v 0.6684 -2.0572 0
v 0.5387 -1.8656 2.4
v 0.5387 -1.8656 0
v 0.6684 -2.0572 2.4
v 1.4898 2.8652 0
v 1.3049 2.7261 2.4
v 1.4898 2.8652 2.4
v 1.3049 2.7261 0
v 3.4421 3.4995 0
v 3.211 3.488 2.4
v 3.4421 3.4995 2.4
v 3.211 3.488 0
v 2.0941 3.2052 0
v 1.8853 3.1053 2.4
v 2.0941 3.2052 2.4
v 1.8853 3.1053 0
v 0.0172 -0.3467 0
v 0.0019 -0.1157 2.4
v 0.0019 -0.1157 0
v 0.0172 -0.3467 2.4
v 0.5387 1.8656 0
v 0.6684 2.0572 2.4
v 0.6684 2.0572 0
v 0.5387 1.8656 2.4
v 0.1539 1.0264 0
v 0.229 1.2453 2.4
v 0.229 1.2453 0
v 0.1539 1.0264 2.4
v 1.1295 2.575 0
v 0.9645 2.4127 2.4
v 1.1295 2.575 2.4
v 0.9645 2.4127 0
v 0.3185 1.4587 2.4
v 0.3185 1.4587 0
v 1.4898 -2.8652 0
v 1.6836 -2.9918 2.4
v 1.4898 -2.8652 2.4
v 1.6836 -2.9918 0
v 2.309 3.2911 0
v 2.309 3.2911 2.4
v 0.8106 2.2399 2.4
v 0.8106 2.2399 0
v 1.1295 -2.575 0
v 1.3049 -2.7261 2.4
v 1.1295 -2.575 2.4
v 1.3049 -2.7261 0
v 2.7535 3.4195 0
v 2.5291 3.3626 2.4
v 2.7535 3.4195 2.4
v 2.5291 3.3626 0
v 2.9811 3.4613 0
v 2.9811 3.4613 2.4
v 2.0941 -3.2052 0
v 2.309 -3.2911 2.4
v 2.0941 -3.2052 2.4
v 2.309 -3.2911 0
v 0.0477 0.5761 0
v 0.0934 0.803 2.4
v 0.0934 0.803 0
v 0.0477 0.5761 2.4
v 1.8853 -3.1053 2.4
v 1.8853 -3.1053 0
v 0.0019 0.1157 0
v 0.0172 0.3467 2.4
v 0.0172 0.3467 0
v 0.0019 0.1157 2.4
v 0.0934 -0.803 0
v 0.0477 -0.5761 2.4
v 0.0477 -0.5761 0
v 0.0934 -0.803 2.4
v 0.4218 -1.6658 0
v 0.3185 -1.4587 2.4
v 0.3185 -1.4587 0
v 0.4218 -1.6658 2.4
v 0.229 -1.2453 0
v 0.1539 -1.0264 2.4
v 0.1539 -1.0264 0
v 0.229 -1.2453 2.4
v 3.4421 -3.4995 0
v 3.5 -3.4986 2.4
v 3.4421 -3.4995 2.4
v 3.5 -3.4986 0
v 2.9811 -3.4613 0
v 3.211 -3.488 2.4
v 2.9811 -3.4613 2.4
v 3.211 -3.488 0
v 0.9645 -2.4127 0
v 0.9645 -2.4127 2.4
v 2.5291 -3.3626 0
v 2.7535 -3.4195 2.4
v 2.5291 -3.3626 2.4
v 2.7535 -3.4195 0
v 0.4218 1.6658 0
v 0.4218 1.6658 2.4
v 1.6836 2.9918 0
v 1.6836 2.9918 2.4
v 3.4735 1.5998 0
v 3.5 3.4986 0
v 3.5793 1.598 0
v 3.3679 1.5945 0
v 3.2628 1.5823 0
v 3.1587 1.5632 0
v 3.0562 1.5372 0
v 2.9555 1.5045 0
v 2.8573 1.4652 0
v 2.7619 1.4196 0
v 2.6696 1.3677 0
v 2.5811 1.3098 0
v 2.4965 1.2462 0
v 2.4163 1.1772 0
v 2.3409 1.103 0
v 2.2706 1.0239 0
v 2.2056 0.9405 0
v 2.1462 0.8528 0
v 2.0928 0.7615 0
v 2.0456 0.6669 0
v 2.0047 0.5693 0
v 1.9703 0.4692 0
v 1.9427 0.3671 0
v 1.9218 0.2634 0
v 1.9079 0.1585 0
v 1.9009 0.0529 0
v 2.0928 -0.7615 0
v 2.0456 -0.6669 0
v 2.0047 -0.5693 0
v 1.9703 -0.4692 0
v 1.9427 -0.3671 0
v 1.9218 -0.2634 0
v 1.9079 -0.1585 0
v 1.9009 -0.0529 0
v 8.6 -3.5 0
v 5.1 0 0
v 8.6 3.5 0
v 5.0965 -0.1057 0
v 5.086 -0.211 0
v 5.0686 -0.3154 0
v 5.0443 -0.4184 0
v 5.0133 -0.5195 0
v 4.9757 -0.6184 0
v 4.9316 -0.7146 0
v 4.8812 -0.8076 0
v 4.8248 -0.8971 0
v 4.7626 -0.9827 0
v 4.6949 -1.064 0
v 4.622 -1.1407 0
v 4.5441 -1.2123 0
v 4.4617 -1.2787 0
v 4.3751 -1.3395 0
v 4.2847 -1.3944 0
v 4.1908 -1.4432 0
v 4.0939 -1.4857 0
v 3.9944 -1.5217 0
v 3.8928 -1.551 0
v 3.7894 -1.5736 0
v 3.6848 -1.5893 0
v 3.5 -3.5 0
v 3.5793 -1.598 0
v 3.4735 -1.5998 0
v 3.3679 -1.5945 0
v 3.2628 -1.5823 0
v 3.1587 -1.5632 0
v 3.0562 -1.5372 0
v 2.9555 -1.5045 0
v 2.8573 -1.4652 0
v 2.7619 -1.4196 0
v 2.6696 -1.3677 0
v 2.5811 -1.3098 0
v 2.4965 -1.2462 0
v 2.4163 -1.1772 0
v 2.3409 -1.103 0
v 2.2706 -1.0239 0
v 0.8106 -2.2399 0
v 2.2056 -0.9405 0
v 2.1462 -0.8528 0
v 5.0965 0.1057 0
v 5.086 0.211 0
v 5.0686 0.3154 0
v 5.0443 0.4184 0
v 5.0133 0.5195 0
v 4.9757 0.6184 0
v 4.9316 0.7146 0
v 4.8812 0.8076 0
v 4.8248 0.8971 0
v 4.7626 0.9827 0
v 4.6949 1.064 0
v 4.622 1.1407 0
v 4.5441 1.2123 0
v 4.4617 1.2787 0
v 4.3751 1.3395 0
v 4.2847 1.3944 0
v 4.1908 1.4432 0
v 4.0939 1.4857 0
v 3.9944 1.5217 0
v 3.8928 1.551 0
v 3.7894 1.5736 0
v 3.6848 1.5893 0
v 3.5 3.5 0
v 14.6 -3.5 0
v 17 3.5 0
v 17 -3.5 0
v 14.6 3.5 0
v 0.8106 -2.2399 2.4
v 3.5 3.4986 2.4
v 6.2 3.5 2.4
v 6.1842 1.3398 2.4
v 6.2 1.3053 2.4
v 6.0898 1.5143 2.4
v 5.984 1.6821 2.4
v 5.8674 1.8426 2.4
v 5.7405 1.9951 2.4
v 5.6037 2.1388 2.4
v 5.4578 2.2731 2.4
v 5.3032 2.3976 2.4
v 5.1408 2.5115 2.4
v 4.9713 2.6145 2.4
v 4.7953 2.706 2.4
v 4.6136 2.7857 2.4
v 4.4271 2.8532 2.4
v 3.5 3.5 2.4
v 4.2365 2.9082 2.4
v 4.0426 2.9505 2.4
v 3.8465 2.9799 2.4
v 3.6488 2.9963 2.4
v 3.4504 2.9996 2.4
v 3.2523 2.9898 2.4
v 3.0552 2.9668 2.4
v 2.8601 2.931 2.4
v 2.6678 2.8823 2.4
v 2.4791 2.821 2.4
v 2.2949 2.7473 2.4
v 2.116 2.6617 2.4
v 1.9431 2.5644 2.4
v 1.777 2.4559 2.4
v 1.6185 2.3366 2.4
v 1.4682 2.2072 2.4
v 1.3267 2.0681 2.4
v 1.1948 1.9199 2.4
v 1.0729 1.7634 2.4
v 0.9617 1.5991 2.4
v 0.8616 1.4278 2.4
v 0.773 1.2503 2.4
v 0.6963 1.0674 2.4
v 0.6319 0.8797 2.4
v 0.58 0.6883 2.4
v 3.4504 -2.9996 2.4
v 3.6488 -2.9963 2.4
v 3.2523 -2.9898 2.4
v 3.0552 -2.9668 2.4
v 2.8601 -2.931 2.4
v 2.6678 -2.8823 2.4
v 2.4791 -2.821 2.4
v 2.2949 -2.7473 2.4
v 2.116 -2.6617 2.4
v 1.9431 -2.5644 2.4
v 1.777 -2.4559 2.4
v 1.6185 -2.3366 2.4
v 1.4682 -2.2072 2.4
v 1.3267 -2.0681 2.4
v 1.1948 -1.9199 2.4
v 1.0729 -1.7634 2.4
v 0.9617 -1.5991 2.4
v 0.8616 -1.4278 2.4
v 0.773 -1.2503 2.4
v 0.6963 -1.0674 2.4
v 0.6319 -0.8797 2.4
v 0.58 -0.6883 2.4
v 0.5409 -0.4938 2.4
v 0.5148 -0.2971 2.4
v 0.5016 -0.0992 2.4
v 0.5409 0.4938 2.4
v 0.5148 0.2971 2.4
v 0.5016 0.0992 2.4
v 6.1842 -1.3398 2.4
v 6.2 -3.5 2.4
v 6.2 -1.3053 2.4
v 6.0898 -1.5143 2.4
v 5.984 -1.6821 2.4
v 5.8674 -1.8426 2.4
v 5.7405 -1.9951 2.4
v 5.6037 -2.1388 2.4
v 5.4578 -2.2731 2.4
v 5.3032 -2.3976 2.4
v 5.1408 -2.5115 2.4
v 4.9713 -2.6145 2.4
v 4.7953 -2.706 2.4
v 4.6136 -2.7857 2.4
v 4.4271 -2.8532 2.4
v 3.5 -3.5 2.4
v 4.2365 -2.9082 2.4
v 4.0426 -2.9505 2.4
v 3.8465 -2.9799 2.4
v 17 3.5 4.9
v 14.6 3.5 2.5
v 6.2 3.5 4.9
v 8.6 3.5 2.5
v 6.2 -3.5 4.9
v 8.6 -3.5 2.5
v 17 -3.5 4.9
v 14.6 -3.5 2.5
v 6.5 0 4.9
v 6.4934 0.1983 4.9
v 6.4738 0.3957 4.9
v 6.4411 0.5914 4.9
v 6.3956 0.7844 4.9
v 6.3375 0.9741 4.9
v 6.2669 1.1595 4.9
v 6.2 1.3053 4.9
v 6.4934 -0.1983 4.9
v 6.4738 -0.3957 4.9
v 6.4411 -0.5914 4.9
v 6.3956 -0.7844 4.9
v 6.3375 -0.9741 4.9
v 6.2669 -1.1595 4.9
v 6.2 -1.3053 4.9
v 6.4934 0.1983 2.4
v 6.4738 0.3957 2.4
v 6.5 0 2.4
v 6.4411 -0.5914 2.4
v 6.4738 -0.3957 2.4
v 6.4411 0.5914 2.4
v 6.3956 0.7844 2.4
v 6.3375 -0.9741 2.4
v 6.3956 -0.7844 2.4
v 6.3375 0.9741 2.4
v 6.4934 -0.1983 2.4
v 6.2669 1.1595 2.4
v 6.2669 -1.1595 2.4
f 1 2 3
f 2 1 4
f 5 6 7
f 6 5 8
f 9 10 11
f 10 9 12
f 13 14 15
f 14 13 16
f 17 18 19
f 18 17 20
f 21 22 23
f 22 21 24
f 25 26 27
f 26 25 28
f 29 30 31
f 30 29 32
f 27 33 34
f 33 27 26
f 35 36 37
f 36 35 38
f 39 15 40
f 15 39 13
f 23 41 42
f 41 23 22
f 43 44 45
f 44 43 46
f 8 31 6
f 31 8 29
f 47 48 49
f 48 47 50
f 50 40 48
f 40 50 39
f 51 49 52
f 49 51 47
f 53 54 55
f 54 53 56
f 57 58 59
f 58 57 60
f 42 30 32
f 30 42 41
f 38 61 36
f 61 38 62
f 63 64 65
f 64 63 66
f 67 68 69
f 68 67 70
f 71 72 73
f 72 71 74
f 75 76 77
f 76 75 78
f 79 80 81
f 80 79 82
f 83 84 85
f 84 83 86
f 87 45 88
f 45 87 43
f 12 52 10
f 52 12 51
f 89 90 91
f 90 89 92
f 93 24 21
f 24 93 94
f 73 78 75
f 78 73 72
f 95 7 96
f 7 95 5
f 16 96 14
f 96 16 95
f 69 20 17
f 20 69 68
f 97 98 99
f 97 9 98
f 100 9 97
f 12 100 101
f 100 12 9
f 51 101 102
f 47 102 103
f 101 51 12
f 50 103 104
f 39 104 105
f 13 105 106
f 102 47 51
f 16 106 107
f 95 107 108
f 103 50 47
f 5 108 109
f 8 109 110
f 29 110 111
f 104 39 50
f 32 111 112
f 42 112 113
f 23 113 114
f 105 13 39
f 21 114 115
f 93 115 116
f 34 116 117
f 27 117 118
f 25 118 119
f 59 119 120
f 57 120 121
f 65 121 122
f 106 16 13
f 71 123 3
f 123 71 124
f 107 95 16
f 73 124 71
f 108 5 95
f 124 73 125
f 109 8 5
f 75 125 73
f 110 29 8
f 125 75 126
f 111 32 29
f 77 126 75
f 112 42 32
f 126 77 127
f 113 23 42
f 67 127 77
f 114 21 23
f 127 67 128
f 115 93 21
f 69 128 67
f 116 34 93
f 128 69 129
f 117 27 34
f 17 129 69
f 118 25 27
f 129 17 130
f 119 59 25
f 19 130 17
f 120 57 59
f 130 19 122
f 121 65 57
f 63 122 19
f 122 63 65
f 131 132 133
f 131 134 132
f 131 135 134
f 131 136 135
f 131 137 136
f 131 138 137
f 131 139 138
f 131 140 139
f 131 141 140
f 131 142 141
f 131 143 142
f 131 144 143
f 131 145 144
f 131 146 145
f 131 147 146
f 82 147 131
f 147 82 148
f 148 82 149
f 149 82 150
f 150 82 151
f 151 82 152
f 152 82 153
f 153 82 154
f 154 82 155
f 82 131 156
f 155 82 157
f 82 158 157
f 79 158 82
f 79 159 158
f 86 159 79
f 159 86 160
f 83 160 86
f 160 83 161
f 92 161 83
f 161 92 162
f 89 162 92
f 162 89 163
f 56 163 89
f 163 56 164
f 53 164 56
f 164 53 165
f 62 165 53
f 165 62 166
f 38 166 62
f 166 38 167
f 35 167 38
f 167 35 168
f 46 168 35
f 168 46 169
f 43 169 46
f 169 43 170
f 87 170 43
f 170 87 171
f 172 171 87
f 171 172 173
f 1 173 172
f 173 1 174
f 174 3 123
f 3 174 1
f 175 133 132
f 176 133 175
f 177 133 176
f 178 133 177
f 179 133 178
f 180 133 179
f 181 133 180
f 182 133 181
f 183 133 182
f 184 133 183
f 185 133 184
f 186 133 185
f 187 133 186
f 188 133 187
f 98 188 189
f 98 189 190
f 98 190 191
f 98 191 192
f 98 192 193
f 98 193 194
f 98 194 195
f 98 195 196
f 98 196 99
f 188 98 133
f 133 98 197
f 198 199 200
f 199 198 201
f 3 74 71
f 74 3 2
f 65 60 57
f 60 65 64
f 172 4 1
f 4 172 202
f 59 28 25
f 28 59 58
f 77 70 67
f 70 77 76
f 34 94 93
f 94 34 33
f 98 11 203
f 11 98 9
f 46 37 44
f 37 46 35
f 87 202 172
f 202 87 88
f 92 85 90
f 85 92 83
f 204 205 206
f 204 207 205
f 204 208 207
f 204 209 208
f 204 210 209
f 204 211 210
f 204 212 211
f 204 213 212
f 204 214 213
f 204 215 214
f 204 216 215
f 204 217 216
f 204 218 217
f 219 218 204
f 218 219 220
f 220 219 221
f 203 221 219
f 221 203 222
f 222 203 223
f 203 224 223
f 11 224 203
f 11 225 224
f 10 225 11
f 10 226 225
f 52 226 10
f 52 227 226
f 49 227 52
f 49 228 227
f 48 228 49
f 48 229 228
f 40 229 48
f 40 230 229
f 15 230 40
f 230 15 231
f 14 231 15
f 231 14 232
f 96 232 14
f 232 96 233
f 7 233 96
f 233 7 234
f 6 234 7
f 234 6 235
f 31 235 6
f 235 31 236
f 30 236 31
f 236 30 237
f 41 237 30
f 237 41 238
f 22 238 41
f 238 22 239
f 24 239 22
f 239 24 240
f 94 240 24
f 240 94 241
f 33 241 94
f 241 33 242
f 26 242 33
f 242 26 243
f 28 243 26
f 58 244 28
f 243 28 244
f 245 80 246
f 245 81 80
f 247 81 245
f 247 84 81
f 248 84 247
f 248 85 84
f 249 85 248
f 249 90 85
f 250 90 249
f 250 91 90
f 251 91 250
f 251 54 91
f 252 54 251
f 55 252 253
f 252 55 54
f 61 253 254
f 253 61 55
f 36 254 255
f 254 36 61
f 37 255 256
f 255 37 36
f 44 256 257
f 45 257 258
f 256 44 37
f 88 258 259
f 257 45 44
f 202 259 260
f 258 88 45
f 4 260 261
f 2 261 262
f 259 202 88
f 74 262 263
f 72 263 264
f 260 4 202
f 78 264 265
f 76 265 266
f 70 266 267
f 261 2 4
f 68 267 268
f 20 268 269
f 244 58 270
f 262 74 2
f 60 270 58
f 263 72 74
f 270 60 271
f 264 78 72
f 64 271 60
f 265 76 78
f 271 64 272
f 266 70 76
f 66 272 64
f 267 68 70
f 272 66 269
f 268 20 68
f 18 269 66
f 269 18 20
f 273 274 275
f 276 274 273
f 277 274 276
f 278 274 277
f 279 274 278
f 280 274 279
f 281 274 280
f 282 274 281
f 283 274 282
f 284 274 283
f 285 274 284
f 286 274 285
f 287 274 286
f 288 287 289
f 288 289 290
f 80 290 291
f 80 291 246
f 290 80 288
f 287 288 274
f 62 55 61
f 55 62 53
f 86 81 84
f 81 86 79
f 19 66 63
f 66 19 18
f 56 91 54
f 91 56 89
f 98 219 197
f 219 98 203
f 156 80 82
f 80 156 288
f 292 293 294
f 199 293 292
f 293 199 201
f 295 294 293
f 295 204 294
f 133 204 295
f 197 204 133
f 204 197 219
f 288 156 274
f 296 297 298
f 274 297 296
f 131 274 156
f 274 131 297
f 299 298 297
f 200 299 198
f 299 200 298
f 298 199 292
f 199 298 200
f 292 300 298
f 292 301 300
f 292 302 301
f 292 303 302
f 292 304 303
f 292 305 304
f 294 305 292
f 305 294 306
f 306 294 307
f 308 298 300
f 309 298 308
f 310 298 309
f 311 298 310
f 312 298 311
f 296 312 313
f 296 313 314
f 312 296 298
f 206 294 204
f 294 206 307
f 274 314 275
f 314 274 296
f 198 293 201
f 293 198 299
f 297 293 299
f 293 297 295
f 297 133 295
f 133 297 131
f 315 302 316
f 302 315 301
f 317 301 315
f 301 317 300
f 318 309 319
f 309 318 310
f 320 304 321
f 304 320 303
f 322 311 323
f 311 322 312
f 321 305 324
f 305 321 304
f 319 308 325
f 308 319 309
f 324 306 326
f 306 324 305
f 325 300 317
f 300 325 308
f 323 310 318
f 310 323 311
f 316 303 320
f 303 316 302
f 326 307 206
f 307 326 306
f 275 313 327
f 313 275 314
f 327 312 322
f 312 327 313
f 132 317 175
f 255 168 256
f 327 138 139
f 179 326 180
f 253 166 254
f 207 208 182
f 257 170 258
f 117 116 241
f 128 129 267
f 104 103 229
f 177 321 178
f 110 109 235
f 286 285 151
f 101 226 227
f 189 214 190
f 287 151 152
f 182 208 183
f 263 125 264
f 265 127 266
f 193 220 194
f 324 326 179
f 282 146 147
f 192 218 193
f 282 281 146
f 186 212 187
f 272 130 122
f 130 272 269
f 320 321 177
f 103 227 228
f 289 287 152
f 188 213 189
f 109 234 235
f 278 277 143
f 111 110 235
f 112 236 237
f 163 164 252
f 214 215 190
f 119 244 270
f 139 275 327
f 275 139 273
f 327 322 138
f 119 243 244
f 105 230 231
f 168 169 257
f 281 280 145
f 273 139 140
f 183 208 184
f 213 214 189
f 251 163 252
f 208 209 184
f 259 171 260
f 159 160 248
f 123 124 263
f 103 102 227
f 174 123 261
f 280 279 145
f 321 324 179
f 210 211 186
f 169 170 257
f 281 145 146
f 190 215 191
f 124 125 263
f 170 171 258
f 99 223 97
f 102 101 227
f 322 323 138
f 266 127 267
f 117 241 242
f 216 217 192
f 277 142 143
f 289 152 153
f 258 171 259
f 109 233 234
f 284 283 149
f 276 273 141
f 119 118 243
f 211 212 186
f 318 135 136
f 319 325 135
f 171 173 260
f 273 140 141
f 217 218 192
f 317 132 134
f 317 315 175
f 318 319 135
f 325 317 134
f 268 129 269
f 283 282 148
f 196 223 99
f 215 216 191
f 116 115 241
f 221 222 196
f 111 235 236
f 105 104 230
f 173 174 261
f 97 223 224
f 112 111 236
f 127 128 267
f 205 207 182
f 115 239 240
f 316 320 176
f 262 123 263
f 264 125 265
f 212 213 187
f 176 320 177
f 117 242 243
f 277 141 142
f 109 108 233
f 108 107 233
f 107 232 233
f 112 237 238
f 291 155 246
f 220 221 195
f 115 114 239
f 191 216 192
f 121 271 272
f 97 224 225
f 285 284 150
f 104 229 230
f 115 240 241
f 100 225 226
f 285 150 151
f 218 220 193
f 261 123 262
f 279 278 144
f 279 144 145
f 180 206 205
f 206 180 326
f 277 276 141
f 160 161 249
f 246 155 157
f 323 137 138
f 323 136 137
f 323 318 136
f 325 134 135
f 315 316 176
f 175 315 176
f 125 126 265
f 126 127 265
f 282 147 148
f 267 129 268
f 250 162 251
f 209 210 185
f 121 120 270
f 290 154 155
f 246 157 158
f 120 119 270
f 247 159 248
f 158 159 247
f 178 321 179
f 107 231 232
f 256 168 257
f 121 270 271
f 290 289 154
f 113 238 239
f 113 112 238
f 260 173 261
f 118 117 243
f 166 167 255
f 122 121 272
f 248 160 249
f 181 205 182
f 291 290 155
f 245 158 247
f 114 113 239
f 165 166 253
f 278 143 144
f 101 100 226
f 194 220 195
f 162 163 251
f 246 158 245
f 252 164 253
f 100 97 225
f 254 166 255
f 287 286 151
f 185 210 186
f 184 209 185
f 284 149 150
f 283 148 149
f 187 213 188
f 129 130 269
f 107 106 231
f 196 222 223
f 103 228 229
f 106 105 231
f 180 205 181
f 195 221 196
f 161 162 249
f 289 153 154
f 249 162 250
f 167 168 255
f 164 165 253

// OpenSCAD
// Držák kabelu v1.0
// Cable holder v1.0
//Copyright (c)2022 DaTT.cz
//-------------------------

//nastavení:            //edit setting: 
velikost         =  17; //holder size
sirka            =   7; //holder width
material         = 2.4; //material width
kabel_x          =   6; //cable X
kabel_z          = 2.5; //cable Z
sroub_s          = 3.2; //screw bottom hole diameter
sroub_v          =   6; //screw top hole diameter

//konec nastavení  //end of setting
//=================================
$fn=95;

module hacek_plochy(){
    difference(){
        union(){
            translate([sirka/2,0,0]) cylinder(h=material, d=sirka);
            translate([sirka/2,-sirka/2,0]) cube([velikost-sirka/2-material-kabel_x, sirka, material]);
            translate([velikost-(kabel_x+material*2),-sirka/2,0]) cube([kabel_x+material*2,sirka,kabel_z+material]);
        }
        translate([velikost-(kabel_x+material),-sirka/2,0]) cube([kabel_x,sirka,kabel_z]);
        translate([sirka/2,0,material]) cylinder(h=material+kabel_z, d=sroub_v);
        translate([sirka/2,0,0]) cylinder(h=material, d1=sroub_s, d2=sroub_v);
    }
}   
  

hacek_plochy();
